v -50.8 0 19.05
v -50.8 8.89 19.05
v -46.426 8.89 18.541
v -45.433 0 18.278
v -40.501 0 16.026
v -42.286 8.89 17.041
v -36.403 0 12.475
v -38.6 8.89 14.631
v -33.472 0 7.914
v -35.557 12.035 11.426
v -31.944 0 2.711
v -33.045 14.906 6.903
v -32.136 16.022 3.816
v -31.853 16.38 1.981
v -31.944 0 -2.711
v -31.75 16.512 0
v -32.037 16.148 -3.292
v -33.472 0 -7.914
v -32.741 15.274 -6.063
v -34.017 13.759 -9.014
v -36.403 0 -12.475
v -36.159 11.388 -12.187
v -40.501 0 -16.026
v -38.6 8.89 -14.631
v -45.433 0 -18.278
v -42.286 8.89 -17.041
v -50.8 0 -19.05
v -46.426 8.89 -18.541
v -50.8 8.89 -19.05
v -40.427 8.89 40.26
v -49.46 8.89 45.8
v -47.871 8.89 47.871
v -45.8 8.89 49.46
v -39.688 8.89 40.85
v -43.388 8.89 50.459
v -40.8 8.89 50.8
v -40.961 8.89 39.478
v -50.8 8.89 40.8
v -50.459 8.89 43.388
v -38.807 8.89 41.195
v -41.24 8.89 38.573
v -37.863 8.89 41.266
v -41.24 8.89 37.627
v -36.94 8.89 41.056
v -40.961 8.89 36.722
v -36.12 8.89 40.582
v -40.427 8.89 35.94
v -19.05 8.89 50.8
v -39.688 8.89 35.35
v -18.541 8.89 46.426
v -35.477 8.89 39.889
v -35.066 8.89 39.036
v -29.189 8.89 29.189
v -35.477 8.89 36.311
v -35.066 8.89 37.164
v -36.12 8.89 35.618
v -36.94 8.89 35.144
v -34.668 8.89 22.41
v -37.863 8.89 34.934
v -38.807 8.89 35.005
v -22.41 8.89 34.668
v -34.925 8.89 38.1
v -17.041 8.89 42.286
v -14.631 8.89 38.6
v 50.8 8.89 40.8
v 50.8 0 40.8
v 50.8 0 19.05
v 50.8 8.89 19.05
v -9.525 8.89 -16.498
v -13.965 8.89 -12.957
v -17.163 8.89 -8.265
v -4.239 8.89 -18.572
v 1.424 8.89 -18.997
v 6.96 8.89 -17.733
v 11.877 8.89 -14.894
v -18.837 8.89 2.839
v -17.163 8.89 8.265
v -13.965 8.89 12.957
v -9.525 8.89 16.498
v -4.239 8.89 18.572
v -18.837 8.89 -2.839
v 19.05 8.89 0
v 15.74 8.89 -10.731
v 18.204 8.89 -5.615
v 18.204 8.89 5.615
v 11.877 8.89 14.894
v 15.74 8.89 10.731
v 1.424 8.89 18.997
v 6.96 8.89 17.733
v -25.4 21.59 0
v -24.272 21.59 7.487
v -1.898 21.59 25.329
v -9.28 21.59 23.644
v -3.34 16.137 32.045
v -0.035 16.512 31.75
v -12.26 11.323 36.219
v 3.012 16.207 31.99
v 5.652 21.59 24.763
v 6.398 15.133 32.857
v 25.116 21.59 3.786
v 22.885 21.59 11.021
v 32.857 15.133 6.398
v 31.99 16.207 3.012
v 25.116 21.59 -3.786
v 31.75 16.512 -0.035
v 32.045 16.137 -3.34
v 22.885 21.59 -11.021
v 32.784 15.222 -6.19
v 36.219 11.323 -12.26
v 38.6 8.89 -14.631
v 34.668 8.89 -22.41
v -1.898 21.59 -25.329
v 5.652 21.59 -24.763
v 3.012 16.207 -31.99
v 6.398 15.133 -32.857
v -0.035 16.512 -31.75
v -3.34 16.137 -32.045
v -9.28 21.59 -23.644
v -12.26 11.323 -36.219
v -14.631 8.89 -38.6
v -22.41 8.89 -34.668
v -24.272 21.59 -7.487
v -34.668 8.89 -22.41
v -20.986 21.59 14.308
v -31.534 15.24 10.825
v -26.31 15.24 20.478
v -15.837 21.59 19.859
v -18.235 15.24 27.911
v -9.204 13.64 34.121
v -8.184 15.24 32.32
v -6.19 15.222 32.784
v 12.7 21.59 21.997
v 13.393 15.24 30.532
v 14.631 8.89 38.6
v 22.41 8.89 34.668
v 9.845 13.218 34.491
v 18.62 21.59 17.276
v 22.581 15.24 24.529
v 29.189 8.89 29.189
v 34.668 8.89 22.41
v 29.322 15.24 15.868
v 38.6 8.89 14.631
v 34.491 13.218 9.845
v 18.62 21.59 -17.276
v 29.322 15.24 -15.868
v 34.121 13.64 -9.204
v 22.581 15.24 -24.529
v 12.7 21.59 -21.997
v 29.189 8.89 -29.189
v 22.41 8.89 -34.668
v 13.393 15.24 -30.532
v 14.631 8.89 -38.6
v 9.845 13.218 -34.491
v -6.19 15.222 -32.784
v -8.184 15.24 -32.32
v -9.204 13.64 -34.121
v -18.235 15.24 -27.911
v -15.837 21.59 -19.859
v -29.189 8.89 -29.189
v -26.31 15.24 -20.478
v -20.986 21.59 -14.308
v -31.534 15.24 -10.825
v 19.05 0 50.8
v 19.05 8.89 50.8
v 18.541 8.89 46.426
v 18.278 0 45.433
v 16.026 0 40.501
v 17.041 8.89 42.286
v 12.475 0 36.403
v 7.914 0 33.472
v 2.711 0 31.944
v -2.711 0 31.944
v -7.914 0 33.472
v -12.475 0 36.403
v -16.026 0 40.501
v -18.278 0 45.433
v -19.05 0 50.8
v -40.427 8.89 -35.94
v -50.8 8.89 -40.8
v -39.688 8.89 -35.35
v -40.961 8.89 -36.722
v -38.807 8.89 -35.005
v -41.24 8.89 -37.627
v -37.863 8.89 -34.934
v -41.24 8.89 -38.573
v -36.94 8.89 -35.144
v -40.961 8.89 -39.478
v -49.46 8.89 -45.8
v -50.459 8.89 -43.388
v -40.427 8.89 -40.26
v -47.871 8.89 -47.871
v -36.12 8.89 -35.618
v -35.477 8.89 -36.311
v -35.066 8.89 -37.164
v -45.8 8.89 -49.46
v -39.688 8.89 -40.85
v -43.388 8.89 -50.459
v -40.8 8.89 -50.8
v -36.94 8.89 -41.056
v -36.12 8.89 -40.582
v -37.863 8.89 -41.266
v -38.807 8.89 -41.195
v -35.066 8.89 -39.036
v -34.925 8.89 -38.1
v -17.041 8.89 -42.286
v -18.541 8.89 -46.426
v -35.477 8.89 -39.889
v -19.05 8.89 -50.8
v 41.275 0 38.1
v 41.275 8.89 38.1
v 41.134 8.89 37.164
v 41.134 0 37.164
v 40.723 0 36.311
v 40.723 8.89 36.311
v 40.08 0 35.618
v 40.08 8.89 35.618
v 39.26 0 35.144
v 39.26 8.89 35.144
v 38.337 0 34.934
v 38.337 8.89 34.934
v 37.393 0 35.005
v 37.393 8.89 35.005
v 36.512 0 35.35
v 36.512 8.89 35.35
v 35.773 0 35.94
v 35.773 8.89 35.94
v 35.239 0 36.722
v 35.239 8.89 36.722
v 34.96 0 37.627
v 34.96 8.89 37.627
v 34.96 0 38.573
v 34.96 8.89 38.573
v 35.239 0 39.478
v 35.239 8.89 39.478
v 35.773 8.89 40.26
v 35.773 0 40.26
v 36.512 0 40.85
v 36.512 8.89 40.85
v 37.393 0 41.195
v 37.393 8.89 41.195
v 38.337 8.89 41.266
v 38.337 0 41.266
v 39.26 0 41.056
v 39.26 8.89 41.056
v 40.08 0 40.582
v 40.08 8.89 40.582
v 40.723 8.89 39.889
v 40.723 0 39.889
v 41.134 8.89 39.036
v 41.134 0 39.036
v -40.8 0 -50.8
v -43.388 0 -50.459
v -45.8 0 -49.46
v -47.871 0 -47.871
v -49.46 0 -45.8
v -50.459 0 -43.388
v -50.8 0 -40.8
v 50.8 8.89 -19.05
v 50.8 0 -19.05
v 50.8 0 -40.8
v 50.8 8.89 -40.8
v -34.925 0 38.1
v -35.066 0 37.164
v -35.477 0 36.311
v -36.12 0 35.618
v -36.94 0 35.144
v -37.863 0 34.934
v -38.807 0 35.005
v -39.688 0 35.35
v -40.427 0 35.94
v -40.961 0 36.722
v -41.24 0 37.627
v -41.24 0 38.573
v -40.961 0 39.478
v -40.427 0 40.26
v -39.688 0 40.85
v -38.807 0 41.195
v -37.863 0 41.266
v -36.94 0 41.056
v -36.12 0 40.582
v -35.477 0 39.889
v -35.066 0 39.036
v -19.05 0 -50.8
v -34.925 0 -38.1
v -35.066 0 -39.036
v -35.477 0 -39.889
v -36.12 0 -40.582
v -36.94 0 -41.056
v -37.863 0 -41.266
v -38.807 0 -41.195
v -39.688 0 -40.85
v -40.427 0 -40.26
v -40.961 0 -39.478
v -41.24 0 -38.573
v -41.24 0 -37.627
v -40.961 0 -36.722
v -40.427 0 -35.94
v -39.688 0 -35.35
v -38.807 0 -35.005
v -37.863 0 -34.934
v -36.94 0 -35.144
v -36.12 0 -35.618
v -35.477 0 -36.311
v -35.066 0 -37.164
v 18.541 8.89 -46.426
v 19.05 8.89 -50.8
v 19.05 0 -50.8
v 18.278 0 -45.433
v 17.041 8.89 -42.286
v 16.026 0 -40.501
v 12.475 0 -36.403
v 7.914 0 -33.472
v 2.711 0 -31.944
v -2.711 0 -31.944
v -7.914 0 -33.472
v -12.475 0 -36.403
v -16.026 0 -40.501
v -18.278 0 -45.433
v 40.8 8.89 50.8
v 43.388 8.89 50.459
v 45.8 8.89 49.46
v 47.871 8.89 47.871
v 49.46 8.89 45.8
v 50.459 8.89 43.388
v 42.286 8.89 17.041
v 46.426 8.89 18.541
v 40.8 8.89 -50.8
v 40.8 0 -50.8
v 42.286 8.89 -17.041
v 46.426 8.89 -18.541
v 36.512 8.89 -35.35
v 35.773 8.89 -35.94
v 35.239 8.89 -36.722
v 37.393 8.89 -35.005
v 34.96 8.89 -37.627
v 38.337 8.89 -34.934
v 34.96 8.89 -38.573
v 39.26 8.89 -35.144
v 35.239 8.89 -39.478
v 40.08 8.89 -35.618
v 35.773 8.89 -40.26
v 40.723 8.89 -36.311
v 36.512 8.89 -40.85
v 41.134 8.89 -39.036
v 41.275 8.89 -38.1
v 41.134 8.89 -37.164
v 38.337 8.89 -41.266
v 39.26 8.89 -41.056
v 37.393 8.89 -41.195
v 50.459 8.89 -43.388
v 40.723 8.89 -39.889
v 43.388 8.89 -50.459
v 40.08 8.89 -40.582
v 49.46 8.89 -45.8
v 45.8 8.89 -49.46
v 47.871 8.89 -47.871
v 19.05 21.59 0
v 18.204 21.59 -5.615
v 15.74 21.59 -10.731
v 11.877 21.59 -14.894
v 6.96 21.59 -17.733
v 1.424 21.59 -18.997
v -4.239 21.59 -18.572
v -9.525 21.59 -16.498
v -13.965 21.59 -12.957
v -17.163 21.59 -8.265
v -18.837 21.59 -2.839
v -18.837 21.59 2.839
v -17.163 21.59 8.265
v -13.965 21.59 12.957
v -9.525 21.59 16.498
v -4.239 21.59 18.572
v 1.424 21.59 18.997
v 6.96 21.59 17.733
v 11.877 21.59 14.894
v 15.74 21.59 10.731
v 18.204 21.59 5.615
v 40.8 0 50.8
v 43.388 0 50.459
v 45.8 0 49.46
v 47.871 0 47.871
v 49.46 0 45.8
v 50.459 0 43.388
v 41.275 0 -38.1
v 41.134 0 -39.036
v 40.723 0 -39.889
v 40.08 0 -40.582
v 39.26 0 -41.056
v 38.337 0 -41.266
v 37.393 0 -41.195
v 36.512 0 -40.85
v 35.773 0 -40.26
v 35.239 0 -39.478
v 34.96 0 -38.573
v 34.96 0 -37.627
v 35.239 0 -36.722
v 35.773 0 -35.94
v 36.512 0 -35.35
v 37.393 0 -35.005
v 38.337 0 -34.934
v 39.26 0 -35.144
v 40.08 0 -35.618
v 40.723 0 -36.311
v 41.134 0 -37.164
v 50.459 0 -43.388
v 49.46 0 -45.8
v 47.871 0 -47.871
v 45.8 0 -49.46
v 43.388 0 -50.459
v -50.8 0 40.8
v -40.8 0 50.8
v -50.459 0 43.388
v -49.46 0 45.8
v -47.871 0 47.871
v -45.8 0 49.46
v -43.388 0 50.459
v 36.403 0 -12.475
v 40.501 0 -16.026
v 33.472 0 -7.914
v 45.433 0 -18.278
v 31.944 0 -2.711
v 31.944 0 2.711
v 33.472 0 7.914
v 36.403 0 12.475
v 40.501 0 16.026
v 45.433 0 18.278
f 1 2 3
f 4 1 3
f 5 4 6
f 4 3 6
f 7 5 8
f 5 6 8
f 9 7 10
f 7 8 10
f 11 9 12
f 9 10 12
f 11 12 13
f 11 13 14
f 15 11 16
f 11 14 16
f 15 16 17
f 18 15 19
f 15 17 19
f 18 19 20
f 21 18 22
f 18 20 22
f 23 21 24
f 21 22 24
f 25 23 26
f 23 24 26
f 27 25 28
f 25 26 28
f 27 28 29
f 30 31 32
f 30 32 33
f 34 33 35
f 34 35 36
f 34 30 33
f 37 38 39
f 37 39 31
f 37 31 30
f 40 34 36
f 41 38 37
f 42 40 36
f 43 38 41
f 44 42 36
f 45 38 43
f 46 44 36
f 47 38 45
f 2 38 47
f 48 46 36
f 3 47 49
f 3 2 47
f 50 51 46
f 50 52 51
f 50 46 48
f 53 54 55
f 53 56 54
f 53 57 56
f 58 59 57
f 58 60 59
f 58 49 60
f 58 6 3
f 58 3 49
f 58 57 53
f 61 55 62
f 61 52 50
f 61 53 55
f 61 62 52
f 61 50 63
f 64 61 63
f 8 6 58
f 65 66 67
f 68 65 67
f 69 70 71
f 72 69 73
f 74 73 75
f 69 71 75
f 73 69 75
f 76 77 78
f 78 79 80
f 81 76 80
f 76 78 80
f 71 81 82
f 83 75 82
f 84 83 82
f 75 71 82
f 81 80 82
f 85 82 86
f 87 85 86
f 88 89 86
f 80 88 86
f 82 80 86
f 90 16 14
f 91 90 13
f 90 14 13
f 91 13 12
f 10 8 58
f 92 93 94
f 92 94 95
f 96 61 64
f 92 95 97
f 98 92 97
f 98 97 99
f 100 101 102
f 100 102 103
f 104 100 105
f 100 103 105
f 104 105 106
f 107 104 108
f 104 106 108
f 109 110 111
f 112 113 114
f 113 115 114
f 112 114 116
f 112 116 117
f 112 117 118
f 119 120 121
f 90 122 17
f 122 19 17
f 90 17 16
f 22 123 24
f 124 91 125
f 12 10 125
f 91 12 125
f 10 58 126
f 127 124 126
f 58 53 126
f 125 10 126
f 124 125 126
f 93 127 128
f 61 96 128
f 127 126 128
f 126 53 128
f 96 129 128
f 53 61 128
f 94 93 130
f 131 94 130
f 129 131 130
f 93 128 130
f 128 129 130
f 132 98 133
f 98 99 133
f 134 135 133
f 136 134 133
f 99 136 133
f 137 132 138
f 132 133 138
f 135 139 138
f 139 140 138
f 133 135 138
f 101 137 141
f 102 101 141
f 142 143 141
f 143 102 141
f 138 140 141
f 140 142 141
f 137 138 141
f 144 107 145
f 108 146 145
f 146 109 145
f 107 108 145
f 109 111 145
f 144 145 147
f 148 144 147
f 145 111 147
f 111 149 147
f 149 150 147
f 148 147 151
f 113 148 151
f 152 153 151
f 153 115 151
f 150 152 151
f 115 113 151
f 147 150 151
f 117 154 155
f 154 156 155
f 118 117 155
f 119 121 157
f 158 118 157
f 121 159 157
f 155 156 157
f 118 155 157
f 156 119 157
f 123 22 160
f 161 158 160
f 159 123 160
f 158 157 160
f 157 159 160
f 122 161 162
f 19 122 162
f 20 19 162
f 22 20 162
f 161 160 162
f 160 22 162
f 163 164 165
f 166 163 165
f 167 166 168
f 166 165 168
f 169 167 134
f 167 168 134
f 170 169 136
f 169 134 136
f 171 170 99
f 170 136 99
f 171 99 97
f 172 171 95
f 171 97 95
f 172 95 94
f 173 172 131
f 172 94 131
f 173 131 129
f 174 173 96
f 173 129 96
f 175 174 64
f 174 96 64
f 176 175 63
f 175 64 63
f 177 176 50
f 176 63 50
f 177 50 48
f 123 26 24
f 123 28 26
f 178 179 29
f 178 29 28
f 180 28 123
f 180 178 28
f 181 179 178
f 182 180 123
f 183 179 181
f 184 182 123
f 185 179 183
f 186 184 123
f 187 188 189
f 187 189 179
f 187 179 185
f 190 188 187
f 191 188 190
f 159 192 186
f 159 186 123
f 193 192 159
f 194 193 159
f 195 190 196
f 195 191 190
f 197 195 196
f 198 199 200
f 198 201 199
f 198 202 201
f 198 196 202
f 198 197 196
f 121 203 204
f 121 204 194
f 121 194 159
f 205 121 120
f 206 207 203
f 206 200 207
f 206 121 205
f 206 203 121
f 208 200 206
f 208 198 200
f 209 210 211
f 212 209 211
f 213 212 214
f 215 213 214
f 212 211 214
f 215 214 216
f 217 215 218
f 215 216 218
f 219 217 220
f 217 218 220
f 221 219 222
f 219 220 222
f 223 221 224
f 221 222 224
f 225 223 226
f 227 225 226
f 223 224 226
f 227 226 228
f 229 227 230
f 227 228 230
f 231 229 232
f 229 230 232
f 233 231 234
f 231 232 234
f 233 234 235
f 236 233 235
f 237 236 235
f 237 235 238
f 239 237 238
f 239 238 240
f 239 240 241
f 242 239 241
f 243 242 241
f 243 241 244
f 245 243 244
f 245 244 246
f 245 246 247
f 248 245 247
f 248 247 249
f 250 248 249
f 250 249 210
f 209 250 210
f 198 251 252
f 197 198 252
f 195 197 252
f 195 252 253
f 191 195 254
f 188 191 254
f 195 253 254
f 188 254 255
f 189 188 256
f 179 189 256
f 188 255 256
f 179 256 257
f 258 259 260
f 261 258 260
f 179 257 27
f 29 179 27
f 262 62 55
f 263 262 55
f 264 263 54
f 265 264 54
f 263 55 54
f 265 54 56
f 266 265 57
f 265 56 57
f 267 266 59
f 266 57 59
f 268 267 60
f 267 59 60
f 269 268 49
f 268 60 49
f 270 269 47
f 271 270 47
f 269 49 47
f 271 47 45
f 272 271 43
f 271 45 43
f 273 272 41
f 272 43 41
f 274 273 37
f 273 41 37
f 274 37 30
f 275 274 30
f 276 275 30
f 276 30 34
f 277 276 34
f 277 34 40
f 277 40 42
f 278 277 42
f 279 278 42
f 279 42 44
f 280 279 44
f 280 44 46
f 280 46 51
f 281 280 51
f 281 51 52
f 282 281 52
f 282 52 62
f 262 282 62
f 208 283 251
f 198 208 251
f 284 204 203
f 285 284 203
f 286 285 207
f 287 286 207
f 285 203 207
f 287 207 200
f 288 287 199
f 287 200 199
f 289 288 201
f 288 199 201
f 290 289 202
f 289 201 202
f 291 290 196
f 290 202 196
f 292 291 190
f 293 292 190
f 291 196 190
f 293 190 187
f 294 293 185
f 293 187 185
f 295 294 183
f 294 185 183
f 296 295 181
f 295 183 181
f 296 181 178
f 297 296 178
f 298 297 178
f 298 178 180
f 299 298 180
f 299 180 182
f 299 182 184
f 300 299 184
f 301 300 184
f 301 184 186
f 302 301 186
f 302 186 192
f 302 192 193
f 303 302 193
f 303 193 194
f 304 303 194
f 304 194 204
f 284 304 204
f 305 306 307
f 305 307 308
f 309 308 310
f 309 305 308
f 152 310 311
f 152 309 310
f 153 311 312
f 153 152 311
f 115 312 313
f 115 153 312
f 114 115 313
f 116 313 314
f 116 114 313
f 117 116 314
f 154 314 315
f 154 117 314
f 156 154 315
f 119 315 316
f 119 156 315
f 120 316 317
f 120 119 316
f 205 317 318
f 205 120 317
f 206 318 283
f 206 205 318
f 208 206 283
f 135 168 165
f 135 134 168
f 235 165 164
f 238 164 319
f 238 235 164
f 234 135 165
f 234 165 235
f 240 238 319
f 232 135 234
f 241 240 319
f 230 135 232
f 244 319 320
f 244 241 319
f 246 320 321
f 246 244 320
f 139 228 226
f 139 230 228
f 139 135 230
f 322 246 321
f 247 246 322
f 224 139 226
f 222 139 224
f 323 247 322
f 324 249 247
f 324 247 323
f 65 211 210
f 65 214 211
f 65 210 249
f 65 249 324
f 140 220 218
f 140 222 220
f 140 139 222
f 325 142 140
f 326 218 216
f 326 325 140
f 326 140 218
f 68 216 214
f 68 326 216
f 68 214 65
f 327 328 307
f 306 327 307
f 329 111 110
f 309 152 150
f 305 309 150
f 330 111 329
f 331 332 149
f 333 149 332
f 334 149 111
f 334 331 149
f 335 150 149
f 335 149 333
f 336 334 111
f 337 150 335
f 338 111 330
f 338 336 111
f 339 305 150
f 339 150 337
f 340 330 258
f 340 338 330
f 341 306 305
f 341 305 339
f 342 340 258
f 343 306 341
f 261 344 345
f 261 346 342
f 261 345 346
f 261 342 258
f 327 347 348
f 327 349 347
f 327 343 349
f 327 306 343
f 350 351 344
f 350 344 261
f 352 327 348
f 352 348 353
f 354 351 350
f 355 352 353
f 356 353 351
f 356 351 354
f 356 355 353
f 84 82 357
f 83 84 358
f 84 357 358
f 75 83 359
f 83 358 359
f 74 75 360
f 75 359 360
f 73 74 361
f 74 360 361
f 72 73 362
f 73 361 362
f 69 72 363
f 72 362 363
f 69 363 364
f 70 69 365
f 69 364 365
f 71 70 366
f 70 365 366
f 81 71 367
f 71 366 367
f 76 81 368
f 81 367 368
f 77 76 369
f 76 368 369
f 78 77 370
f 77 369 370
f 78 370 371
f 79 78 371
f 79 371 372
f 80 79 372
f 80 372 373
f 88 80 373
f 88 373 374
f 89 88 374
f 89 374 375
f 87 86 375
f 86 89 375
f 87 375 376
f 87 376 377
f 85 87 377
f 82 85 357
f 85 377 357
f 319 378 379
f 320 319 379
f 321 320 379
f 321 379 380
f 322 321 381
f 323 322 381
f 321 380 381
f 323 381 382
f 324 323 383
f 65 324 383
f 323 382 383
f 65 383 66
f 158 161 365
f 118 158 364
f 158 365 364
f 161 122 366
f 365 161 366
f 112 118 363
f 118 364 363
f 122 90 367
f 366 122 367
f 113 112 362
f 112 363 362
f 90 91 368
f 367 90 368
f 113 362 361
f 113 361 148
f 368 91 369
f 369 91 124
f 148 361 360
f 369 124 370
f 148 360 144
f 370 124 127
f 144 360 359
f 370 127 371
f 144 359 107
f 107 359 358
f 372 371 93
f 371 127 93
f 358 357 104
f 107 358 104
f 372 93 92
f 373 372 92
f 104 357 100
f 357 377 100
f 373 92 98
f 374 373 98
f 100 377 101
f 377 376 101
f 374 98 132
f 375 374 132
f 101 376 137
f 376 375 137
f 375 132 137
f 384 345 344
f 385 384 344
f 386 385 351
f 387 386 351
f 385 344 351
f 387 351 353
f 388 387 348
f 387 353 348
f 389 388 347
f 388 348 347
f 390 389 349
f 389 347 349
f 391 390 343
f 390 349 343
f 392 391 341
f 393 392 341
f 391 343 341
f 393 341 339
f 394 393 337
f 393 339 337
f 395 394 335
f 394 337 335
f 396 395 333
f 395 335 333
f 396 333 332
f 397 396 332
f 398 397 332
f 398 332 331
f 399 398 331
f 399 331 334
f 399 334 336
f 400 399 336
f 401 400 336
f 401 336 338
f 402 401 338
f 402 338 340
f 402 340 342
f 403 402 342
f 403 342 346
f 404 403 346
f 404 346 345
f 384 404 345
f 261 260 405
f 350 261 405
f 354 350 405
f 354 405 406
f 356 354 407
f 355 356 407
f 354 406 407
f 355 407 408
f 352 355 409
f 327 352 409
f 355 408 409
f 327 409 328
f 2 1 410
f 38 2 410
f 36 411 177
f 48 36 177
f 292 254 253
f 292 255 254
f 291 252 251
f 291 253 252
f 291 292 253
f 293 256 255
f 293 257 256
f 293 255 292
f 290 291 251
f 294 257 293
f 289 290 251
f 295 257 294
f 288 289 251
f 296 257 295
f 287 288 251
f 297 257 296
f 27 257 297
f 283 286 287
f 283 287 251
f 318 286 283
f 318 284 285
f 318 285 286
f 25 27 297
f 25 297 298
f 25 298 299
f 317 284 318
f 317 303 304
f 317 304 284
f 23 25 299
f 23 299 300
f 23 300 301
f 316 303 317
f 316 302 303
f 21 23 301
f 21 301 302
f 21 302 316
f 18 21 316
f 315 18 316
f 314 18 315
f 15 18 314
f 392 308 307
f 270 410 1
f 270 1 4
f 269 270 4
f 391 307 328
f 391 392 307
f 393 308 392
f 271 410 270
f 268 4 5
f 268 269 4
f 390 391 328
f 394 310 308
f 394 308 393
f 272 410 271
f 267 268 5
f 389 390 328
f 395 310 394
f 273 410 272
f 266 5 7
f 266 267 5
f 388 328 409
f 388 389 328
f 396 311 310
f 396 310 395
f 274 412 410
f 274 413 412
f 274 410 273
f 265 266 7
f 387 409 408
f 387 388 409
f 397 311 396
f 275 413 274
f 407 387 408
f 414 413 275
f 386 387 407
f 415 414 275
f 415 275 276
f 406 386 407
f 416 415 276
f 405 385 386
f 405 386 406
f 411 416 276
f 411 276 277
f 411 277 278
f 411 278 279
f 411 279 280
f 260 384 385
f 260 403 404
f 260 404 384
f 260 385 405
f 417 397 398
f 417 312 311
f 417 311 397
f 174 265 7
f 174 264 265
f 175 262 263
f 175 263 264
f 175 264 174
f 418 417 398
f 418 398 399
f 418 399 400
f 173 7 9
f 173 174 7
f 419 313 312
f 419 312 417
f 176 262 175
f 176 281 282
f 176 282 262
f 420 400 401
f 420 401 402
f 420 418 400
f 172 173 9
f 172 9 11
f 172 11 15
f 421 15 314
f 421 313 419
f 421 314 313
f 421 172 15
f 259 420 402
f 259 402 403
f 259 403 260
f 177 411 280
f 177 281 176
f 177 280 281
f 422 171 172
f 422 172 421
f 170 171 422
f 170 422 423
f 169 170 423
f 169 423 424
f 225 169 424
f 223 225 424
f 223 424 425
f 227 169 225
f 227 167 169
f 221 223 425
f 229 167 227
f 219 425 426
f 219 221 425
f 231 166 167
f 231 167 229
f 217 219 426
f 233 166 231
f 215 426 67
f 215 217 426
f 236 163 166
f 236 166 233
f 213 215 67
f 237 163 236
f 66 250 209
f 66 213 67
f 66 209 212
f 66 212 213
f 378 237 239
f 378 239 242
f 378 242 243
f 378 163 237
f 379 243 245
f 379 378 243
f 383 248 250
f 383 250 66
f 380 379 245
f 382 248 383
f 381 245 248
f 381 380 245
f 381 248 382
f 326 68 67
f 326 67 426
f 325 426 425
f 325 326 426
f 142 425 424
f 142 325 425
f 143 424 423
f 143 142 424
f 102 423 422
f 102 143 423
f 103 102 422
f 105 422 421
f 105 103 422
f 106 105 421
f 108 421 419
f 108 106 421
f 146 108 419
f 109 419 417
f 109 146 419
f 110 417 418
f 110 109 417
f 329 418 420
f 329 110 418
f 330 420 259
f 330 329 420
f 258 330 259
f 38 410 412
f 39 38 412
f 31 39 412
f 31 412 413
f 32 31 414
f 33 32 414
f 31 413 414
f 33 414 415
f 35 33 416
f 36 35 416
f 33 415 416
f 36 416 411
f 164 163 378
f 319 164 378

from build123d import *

# Parameters (mm, degrees)
BOSS_EXTRUDE1_DEPTH = 8.89
SKETCH3_R           = 19.05
SKETCH3_R_2         = 3.175
CUT_EXTRUDE1_DEPTH  = 22.59
SKETCH4_R           = 19.05
BOSS_EXTRUDE3_DEPTH = 8.89


with BuildPart() as part:
    # Sketch1 → Boss-Extrude1 (new body)
    with BuildSketch(Plane(origin=(0, 0, 0), x_dir=(1, 0, 0), z_dir=(0, 1, 0))):
        with BuildLine():
            Line((40.8, 50.8), (-40.8, 50.8))
            ThreePointArc((-40.8, 50.8), (-47.871067812, 47.871067812), (-50.8, 40.8))
            Line((-50.8, 40.8), (-50.8, -40.8))
            ThreePointArc((-50.8, -40.8), (-47.871067812, -47.871067812), (-40.8, -50.8))
            Line((-40.8, -50.8), (40.8, -50.8))
            ThreePointArc((40.8, -50.8), (47.871067812, -47.871067812), (50.8, -40.8))
            Line((50.8, -40.8), (50.8, 40.8))
            ThreePointArc((50.8, 40.8), (47.871067812, 47.871067812), (40.8, 50.8))
        make_face()
    extrude(amount=BOSS_EXTRUDE1_DEPTH)

    # Sketch2 → Revolve1 (revolve)
    with BuildSketch(Plane.XY):
        Polygon((0, 8.89), (0, 21.59), (-25.4, 21.59), (-41.28, 8.89), align=None)
    revolve(axis=Axis((0, 8.89, 0), (0, 1, 0)))

    # Sketch3 → Cut-Extrude1 (cut, through all)
    with BuildSketch(Plane(origin=(0, 21.59, 0), x_dir=(1, 0, 0), z_dir=(0, 1, 0))):
        Circle(SKETCH3_R)
        with Locations((-38.1, 38.1)):
            Circle(SKETCH3_R_2)
        with Locations((38.1, 38.1)):
            Circle(SKETCH3_R_2)
        with Locations((38.1, -38.1)):
            Circle(SKETCH3_R_2)
        with Locations((-38.1, -38.1)):
            Circle(SKETCH3_R_2)
        with BuildLine():
            Line((-50.8, 19.05), (-50.8, -19.05))
            ThreePointArc((-50.8, -19.05), (-31.75, 0), (-50.8, 19.05))
        make_face()
        with BuildLine():
            Line((-19.05, 50.8), (19.05, 50.8))
            ThreePointArc((19.05, 50.8), (0, 31.75), (-19.05, 50.8))
        make_face()
        with BuildLine():
            Line((50.8, 19.05), (50.8, -19.05))
            ThreePointArc((50.8, -19.05), (31.75, 0), (50.8, 19.05))
        make_face()
        with BuildLine():
            Line((-19.05, -50.8), (19.05, -50.8))
            ThreePointArc((19.05, -50.8), (0, -31.75), (-19.05, -50.8))
        make_face()
    extrude(amount=-CUT_EXTRUDE1_DEPTH, mode=Mode.SUBTRACT)

    # Sketch4 → Boss-Extrude3 (add)
    with BuildSketch(Plane.XZ):
        Circle(SKETCH4_R)
    extrude(amount=-BOSS_EXTRUDE3_DEPTH)


solid = part.part
